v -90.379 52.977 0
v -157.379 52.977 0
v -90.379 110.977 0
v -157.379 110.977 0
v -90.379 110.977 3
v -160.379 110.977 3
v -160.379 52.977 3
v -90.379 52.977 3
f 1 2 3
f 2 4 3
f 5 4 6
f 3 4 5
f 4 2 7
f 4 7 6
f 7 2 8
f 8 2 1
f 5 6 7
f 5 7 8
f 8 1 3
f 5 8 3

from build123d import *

# Parameters (mm, degrees)
SKETCH1_W           = 70
SKETCH1_H           = 58
BOSS_EXTRUDE1_DEPTH = 3
CHAMFER1_SIZE       = 3


with BuildPart() as part:
    # Sketch1 → Boss-Extrude1 (new body)
    with BuildSketch(Plane.XY):
        with Locations((-125.379084176, 81.977207271)):
            Rectangle(SKETCH1_W, SKETCH1_H)
    extrude(amount=BOSS_EXTRUDE1_DEPTH)

    # Chamfer1
    chamfer1_edges = [part.edges().sort_by_distance(p)[0] for p in [
        (-160.379084176, 81.977207271, 0),
    ]]
    chamfer(chamfer1_edges, length=CHAMFER1_SIZE - 0.0001)  # a hair under: the kernel refuses the full size


solid = part.part
